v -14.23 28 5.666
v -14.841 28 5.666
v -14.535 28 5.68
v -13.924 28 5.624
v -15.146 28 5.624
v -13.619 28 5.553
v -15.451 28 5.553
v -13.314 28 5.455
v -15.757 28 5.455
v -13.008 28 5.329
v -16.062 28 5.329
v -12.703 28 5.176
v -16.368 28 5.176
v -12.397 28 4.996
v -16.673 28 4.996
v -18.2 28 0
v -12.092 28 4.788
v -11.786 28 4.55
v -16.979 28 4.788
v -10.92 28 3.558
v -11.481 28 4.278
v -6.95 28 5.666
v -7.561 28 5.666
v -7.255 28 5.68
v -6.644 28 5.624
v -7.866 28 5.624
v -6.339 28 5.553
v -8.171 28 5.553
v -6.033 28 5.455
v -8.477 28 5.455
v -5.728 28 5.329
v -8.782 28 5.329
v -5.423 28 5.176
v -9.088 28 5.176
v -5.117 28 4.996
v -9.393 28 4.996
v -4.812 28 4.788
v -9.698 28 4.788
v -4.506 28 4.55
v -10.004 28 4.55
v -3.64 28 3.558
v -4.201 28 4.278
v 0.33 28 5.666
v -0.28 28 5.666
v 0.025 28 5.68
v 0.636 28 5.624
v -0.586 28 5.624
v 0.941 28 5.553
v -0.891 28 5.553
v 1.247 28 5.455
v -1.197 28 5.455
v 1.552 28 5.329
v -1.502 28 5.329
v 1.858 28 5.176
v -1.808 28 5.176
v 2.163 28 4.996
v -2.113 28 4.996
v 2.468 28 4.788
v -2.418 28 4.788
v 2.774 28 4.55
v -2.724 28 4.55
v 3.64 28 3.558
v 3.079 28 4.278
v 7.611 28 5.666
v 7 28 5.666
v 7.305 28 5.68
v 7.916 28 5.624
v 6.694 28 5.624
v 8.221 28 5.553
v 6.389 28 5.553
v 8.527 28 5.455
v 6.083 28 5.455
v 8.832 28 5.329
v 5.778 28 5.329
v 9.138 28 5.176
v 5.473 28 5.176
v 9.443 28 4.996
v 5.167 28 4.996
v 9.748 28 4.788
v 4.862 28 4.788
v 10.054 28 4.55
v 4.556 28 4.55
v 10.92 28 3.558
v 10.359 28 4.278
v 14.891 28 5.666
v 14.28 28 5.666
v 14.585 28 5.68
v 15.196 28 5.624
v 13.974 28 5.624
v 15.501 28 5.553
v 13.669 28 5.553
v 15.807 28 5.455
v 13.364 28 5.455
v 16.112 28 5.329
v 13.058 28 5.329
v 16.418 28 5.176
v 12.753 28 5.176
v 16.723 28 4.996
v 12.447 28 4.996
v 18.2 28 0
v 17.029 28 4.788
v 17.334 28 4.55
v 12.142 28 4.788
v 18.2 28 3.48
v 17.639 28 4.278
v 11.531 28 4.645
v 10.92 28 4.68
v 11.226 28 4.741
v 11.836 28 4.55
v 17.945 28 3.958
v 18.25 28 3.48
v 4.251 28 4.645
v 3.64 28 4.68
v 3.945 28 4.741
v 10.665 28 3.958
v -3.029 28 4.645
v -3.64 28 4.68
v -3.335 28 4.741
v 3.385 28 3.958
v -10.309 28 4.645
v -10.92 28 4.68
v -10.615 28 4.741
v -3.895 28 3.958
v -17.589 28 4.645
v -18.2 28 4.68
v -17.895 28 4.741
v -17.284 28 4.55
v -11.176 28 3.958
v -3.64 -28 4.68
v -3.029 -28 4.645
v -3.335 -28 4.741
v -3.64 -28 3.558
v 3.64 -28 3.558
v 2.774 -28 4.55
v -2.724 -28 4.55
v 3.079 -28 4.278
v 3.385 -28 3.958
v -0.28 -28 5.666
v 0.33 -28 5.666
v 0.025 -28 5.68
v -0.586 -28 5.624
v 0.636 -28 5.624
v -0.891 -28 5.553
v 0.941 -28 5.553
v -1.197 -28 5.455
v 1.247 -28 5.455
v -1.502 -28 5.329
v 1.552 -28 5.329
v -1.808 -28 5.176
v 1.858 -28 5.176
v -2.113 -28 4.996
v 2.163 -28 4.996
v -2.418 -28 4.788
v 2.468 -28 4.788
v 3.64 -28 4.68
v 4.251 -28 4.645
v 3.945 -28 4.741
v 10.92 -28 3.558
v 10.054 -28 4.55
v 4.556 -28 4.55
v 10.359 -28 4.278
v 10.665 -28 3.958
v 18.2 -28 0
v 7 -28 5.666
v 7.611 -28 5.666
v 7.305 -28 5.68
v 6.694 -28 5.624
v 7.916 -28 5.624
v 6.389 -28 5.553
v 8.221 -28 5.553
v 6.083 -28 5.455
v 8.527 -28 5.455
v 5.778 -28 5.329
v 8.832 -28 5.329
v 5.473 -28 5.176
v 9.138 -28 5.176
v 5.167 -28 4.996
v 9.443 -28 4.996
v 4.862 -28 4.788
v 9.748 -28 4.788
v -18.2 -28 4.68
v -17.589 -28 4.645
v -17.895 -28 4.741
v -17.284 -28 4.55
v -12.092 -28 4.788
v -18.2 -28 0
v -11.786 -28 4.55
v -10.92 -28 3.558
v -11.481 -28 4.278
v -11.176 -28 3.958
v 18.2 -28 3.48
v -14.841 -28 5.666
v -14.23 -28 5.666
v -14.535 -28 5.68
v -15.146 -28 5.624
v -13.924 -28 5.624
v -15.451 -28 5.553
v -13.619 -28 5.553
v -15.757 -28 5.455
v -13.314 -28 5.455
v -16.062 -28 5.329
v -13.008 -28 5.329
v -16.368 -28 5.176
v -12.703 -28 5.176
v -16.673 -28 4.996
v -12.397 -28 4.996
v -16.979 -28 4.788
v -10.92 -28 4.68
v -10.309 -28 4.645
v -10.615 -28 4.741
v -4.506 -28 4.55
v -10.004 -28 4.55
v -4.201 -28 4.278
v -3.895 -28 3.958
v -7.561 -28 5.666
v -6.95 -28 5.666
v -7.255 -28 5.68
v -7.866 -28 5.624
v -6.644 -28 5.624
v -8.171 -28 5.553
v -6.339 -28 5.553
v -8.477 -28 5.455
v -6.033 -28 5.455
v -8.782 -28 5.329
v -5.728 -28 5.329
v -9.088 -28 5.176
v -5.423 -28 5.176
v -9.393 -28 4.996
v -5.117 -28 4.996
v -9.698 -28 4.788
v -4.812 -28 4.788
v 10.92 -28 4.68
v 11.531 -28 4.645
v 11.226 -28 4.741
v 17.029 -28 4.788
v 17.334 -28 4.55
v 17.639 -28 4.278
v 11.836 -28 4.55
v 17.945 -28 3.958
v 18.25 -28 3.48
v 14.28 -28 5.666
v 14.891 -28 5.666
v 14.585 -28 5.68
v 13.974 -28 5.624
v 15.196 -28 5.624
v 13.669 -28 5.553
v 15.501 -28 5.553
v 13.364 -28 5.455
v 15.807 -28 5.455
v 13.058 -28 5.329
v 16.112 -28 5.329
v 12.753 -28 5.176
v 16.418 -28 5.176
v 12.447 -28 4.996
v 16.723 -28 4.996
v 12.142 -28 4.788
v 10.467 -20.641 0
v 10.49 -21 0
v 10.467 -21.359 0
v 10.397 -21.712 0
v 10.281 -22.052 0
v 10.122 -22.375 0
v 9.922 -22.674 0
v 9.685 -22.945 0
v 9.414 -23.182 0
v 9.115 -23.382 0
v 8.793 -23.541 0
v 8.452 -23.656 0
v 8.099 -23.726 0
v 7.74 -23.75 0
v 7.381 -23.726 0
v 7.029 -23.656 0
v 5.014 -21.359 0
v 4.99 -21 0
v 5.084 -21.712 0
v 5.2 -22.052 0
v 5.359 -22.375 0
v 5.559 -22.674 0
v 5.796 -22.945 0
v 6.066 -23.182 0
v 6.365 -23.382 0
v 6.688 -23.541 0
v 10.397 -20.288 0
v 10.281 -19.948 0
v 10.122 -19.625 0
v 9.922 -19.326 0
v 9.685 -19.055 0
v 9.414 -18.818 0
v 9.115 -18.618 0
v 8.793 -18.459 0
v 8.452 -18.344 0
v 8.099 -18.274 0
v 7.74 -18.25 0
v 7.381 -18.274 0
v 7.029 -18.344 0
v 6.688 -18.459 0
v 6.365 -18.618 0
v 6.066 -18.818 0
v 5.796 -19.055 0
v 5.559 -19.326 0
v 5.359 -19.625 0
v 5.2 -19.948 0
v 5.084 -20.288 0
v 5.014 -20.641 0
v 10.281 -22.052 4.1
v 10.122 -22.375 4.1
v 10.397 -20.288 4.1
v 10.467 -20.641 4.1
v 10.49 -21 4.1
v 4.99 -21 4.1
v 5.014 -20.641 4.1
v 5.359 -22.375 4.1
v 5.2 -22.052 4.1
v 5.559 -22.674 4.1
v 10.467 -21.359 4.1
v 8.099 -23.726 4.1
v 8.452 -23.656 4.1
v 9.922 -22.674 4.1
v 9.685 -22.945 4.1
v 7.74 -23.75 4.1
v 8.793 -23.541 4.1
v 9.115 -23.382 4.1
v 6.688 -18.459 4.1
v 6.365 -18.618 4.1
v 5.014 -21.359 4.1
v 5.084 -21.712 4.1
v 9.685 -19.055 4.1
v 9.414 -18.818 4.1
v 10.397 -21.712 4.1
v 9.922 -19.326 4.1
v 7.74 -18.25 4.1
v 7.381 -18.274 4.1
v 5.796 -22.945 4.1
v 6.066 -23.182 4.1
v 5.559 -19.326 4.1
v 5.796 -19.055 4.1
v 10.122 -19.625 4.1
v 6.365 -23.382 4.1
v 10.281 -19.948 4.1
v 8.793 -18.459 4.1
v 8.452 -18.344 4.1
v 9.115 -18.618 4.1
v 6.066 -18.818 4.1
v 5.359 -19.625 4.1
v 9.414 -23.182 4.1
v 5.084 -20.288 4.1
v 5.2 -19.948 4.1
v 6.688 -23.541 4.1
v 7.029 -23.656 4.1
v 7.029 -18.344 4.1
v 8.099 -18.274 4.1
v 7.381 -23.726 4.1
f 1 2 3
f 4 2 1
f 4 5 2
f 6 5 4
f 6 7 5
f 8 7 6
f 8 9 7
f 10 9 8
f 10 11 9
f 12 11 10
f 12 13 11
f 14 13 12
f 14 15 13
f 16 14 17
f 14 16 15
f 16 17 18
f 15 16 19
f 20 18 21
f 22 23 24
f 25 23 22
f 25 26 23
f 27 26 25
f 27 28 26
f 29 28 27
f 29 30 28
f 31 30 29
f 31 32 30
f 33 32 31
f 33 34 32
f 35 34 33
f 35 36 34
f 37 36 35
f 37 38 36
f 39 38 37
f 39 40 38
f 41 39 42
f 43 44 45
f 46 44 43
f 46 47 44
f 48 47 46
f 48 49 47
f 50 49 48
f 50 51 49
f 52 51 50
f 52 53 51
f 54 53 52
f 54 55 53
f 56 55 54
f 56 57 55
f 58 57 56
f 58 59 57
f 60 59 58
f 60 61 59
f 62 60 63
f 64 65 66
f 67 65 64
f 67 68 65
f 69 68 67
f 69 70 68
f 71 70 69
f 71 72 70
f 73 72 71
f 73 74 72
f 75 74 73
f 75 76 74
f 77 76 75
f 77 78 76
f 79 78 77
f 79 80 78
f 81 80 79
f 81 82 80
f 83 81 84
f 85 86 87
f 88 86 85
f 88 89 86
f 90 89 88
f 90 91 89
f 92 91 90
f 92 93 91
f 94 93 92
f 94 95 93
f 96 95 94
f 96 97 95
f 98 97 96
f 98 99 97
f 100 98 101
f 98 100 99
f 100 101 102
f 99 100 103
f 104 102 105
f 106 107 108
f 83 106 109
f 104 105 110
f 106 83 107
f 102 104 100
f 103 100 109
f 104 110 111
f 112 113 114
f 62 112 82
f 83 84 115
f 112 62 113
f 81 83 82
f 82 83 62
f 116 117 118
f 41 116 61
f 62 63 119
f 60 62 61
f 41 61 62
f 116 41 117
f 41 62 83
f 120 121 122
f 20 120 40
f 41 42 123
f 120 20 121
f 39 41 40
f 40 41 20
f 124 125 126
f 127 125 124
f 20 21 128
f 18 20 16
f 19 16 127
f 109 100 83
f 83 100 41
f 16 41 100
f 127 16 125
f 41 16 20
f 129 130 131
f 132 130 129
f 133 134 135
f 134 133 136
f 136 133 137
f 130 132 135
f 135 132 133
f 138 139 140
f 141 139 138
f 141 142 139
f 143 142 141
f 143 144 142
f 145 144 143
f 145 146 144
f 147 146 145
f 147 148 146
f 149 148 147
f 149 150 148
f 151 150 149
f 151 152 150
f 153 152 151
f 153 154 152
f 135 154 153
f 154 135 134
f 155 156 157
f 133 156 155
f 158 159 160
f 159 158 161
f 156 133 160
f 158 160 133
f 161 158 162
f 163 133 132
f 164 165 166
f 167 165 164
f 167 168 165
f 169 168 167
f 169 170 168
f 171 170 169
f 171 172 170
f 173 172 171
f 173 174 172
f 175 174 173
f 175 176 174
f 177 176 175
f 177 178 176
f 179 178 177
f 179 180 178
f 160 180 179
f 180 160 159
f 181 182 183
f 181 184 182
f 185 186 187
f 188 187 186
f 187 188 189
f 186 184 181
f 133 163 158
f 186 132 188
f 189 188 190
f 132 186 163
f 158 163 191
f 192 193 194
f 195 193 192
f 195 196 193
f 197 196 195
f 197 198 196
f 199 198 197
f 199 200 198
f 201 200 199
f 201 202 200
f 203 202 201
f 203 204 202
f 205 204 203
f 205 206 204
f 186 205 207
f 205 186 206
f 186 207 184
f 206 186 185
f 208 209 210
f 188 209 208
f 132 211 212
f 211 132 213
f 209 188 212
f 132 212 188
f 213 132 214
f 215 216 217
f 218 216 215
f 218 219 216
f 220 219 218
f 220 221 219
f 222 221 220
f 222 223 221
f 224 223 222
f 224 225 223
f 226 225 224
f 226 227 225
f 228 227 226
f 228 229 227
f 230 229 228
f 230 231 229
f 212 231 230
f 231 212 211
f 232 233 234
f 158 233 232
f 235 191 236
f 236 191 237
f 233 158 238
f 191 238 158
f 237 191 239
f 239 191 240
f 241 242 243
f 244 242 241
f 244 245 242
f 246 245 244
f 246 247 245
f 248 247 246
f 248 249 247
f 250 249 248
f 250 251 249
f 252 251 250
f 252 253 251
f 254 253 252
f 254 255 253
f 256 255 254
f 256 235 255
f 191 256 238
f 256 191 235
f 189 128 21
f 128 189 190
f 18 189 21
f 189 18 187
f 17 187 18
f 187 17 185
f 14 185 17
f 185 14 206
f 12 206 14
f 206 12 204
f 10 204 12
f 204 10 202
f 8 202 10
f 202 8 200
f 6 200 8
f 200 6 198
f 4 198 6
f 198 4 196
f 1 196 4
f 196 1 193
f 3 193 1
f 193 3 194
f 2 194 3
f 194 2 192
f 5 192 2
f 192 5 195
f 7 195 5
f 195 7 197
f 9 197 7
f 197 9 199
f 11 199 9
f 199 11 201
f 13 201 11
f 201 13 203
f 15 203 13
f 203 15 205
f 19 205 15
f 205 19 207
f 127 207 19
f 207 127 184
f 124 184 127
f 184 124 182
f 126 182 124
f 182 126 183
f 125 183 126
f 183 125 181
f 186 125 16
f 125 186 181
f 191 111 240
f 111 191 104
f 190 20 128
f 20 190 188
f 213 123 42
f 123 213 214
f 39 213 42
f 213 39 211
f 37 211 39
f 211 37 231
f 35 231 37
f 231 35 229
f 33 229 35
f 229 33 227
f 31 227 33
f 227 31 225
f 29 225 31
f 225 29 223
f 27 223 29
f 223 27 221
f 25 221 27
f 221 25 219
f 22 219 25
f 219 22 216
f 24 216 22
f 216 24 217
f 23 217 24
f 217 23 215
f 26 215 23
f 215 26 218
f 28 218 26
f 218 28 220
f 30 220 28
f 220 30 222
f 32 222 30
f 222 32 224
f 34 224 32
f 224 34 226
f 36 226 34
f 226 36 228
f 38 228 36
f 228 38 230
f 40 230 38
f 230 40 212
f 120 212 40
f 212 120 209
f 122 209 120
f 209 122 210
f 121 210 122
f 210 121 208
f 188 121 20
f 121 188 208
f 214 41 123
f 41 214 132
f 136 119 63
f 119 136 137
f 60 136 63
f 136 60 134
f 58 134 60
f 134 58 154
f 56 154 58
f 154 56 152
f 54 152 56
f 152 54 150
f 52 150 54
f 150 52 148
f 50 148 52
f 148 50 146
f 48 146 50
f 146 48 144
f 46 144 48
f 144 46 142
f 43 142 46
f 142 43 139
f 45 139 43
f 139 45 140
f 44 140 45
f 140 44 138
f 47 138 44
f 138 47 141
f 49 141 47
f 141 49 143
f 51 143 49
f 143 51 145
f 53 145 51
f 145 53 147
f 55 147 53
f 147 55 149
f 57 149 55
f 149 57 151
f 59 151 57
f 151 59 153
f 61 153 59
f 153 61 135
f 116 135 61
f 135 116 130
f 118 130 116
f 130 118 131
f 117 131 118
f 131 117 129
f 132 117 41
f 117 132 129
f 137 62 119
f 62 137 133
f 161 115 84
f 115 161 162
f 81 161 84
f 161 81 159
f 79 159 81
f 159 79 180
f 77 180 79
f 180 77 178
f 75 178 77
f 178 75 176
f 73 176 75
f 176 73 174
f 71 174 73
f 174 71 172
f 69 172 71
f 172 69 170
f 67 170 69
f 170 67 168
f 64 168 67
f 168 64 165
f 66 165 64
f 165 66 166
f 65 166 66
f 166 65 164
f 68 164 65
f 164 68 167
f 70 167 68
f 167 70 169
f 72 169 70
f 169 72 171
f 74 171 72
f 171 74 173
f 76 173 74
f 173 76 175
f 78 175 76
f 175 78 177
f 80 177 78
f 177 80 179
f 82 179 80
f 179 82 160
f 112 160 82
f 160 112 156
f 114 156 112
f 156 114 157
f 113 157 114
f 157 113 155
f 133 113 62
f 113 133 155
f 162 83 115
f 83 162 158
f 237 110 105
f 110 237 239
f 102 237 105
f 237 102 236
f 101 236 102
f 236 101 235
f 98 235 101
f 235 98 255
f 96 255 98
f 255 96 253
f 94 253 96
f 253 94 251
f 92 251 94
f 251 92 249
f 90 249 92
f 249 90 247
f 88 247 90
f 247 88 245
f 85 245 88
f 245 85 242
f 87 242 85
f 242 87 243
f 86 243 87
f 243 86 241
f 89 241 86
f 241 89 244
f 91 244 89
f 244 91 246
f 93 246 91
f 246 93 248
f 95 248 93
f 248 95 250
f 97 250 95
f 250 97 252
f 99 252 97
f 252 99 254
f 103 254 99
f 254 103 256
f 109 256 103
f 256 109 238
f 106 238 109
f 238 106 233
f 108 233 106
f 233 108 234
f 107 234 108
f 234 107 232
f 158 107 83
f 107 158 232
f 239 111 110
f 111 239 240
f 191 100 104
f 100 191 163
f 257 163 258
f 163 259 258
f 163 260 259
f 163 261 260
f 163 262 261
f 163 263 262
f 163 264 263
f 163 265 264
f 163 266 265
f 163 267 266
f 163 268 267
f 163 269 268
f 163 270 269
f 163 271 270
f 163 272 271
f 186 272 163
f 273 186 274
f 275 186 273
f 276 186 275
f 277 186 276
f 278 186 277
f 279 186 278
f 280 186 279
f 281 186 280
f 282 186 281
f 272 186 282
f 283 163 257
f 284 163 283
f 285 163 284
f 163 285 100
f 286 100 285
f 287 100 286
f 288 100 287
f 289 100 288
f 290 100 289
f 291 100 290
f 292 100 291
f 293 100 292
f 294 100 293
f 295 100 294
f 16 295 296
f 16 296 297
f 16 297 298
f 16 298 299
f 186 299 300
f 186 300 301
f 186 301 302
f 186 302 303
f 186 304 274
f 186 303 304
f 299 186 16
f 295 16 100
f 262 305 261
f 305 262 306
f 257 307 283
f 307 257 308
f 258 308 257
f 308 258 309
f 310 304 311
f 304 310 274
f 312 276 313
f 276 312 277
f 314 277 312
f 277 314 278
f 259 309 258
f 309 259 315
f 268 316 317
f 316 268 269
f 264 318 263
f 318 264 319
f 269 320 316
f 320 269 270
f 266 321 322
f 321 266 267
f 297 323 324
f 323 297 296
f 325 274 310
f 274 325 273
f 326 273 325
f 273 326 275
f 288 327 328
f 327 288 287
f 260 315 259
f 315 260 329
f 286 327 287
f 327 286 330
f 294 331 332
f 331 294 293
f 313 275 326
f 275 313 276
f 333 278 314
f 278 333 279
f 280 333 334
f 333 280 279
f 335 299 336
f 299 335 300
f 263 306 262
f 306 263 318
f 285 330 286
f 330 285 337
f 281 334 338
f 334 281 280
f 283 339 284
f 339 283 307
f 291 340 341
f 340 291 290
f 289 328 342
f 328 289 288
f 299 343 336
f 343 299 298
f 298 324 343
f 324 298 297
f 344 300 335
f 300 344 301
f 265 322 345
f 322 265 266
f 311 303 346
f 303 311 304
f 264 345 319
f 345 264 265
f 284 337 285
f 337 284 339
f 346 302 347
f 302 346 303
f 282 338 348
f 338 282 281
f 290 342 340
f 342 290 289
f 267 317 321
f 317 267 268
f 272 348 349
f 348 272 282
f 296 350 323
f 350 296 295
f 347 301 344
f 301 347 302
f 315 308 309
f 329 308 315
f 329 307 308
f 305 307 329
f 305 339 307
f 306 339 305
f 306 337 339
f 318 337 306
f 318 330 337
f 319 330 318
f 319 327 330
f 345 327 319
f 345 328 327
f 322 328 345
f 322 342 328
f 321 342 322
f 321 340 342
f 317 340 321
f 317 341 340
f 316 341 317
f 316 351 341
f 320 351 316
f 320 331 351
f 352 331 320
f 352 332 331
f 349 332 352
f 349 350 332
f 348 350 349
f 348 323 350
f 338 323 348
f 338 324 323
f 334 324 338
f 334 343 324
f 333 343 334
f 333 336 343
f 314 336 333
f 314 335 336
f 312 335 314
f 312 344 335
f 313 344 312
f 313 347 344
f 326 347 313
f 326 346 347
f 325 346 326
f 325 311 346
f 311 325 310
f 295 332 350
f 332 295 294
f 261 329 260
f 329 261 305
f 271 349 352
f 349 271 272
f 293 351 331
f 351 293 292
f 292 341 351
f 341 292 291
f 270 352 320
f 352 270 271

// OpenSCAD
// =========================================================
// AGUA DO TELHADO (DEITADA, CENTRALIZADA E COM TELHAS)
// Sistema Modular 50x50 mm | Espessura parede: 8 mm
// Auditado e validado para OpenSCAD 2021.01
// =========================================================

// --- Dimensoes do sistema modular (50x50 mm, parede 8 mm) ---
lado_parede      = 50;      // Passo modular da parede
espessura_parede = 8;       // Espessura da parede
qtd_modulos_y    = 1;       // 1 = 50 mm (1 parede), 2 = 100 mm (2 paredes)

// --- Geometria da agua do telhado (deitada na mesa em Z = 0) ---
altura_pico      = 22;      // Altura do pico (define a largura/inclinação da rampa)
beiral_lateral   = 4;       // Sobrinha na borda externa da rampa
beiral_frente    = 3;       // Sobrinha nas extremidades ao longo do comprimento
espessura_base   = 3.5;     // Espessura da base plana da telha

// --- Formato das telhas (fileiras de telhas canal/capa) ---
tem_telhas       = true;    // Ativa o formato de telhas
qtd_fileiras     = 5;       // Quantidade de fileiras de telhas ao longo da rampa
altura_telha     = 2.2;     // Altura do relevo da telha acima da base
sobreposicao_mm  = 1.2;     // Degrau de sobreposicao entre fileiras de telhas

// --- Furos de encaixe (pinos da parede: raio 2.5 mm, folga 0.25 mm) ---
raio_pino        = 2.5;
altura_furo      = 4.0;
folga_encaixe    = 0.25;
qtd_pinos_topo   = 2;

$fn = 48;

module furo_encaixe(r, h, folga) {
    cylinder(h = h + 0.2, r = r + folga);
}

// Perfil 2D de uma fileira de telha (formato abaulado com degrau de encavalamento)
module perfil_fileira_telha(larg_fileira, h_base, h_telha, degrau) {
    passos = 24;
    dx = larg_fileira / passos;

    pts_baixo = [
        [larg_fileira, 0],
        [0, 0]
    ];

    pts_cima = [
        for (i = [0 : passos])
            let(
                u = i / passos,
                // Perfil abaulado suave + leve degrau no inicio da fileira
                curva = h_telha * pow(sin(180 * u), 0.75),
                deg = (u < 0.12) ? (degrau * (1 - u / 0.12)) : 0
            )
            [i * dx, h_base + curva + deg]
    ];

    polygon(points = concat(pts_baixo, pts_cima));
}

module agua_telhado_deitada() {
    // Largura util da rampa da borda externa ate o centro do pico (50/2 = 25 mm)
    metade_base = lado_parede / 2;
    larg_rampa = sqrt(pow(metade_base + beiral_lateral, 2) + pow(altura_pico, 2));
    comp_y = (lado_parede * qtd_modulos_y) + (2 * beiral_frente);

    larg_fileira = larg_rampa / qtd_fileiras;

    // Centralizado em X e Y sobre a mesa (Z = 0)
    translate([-larg_rampa / 2, -comp_y / 2, 0]) {
        difference() {
            union() {
                // Base solida apoiada na mesa (Z = 0)
                cube([larg_rampa, comp_y, espessura_base]);

                // Fileiras de telhas ao longo da rampa (eixo X da peça deitada)
                if (tem_telhas) {
                    for (f = [0 : qtd_fileiras - 1]) {
                        x_f = f * larg_fileira;
                        translate([x_f, comp_y, espessura_base - 0.02])
                            rotate([90, 0, 0])
                                linear_extrude(height = comp_y)
                                    perfil_fileira_telha(
                                        larg_fileira + 0.05,
                                        0,
                                        altura_telha,
                                        sobreposicao_mm
                                    );
                    }
                }
            }

            // Furos alinhados com os pinos do topo das paredes de 50x50 mm
            // Na parede: pinos ficam em X_parede e Y = espessura_parede / 2
            angulo_rampa = atan2(altura_pico, metade_base + beiral_lateral);

            for (m = [0 : qtd_modulos_y - 1]) {
                for (i = [1 : qtd_pinos_topo]) {
                    x_parede = (lado_parede / (qtd_pinos_topo + 1)) * i;
                    dist_rampa = (beiral_lateral + x_parede) / cos(angulo_rampa);

                    y_na_peca = beiral_frente + (m * lado_parede) + (espessura_parede / 2);

                    translate([dist_rampa, y_na_peca, -0.1])
                        furo_encaixe(raio_pino, altura_furo, folga_encaixe);
                }
            }
        }
    }
}

agua_telhado_deitada();
